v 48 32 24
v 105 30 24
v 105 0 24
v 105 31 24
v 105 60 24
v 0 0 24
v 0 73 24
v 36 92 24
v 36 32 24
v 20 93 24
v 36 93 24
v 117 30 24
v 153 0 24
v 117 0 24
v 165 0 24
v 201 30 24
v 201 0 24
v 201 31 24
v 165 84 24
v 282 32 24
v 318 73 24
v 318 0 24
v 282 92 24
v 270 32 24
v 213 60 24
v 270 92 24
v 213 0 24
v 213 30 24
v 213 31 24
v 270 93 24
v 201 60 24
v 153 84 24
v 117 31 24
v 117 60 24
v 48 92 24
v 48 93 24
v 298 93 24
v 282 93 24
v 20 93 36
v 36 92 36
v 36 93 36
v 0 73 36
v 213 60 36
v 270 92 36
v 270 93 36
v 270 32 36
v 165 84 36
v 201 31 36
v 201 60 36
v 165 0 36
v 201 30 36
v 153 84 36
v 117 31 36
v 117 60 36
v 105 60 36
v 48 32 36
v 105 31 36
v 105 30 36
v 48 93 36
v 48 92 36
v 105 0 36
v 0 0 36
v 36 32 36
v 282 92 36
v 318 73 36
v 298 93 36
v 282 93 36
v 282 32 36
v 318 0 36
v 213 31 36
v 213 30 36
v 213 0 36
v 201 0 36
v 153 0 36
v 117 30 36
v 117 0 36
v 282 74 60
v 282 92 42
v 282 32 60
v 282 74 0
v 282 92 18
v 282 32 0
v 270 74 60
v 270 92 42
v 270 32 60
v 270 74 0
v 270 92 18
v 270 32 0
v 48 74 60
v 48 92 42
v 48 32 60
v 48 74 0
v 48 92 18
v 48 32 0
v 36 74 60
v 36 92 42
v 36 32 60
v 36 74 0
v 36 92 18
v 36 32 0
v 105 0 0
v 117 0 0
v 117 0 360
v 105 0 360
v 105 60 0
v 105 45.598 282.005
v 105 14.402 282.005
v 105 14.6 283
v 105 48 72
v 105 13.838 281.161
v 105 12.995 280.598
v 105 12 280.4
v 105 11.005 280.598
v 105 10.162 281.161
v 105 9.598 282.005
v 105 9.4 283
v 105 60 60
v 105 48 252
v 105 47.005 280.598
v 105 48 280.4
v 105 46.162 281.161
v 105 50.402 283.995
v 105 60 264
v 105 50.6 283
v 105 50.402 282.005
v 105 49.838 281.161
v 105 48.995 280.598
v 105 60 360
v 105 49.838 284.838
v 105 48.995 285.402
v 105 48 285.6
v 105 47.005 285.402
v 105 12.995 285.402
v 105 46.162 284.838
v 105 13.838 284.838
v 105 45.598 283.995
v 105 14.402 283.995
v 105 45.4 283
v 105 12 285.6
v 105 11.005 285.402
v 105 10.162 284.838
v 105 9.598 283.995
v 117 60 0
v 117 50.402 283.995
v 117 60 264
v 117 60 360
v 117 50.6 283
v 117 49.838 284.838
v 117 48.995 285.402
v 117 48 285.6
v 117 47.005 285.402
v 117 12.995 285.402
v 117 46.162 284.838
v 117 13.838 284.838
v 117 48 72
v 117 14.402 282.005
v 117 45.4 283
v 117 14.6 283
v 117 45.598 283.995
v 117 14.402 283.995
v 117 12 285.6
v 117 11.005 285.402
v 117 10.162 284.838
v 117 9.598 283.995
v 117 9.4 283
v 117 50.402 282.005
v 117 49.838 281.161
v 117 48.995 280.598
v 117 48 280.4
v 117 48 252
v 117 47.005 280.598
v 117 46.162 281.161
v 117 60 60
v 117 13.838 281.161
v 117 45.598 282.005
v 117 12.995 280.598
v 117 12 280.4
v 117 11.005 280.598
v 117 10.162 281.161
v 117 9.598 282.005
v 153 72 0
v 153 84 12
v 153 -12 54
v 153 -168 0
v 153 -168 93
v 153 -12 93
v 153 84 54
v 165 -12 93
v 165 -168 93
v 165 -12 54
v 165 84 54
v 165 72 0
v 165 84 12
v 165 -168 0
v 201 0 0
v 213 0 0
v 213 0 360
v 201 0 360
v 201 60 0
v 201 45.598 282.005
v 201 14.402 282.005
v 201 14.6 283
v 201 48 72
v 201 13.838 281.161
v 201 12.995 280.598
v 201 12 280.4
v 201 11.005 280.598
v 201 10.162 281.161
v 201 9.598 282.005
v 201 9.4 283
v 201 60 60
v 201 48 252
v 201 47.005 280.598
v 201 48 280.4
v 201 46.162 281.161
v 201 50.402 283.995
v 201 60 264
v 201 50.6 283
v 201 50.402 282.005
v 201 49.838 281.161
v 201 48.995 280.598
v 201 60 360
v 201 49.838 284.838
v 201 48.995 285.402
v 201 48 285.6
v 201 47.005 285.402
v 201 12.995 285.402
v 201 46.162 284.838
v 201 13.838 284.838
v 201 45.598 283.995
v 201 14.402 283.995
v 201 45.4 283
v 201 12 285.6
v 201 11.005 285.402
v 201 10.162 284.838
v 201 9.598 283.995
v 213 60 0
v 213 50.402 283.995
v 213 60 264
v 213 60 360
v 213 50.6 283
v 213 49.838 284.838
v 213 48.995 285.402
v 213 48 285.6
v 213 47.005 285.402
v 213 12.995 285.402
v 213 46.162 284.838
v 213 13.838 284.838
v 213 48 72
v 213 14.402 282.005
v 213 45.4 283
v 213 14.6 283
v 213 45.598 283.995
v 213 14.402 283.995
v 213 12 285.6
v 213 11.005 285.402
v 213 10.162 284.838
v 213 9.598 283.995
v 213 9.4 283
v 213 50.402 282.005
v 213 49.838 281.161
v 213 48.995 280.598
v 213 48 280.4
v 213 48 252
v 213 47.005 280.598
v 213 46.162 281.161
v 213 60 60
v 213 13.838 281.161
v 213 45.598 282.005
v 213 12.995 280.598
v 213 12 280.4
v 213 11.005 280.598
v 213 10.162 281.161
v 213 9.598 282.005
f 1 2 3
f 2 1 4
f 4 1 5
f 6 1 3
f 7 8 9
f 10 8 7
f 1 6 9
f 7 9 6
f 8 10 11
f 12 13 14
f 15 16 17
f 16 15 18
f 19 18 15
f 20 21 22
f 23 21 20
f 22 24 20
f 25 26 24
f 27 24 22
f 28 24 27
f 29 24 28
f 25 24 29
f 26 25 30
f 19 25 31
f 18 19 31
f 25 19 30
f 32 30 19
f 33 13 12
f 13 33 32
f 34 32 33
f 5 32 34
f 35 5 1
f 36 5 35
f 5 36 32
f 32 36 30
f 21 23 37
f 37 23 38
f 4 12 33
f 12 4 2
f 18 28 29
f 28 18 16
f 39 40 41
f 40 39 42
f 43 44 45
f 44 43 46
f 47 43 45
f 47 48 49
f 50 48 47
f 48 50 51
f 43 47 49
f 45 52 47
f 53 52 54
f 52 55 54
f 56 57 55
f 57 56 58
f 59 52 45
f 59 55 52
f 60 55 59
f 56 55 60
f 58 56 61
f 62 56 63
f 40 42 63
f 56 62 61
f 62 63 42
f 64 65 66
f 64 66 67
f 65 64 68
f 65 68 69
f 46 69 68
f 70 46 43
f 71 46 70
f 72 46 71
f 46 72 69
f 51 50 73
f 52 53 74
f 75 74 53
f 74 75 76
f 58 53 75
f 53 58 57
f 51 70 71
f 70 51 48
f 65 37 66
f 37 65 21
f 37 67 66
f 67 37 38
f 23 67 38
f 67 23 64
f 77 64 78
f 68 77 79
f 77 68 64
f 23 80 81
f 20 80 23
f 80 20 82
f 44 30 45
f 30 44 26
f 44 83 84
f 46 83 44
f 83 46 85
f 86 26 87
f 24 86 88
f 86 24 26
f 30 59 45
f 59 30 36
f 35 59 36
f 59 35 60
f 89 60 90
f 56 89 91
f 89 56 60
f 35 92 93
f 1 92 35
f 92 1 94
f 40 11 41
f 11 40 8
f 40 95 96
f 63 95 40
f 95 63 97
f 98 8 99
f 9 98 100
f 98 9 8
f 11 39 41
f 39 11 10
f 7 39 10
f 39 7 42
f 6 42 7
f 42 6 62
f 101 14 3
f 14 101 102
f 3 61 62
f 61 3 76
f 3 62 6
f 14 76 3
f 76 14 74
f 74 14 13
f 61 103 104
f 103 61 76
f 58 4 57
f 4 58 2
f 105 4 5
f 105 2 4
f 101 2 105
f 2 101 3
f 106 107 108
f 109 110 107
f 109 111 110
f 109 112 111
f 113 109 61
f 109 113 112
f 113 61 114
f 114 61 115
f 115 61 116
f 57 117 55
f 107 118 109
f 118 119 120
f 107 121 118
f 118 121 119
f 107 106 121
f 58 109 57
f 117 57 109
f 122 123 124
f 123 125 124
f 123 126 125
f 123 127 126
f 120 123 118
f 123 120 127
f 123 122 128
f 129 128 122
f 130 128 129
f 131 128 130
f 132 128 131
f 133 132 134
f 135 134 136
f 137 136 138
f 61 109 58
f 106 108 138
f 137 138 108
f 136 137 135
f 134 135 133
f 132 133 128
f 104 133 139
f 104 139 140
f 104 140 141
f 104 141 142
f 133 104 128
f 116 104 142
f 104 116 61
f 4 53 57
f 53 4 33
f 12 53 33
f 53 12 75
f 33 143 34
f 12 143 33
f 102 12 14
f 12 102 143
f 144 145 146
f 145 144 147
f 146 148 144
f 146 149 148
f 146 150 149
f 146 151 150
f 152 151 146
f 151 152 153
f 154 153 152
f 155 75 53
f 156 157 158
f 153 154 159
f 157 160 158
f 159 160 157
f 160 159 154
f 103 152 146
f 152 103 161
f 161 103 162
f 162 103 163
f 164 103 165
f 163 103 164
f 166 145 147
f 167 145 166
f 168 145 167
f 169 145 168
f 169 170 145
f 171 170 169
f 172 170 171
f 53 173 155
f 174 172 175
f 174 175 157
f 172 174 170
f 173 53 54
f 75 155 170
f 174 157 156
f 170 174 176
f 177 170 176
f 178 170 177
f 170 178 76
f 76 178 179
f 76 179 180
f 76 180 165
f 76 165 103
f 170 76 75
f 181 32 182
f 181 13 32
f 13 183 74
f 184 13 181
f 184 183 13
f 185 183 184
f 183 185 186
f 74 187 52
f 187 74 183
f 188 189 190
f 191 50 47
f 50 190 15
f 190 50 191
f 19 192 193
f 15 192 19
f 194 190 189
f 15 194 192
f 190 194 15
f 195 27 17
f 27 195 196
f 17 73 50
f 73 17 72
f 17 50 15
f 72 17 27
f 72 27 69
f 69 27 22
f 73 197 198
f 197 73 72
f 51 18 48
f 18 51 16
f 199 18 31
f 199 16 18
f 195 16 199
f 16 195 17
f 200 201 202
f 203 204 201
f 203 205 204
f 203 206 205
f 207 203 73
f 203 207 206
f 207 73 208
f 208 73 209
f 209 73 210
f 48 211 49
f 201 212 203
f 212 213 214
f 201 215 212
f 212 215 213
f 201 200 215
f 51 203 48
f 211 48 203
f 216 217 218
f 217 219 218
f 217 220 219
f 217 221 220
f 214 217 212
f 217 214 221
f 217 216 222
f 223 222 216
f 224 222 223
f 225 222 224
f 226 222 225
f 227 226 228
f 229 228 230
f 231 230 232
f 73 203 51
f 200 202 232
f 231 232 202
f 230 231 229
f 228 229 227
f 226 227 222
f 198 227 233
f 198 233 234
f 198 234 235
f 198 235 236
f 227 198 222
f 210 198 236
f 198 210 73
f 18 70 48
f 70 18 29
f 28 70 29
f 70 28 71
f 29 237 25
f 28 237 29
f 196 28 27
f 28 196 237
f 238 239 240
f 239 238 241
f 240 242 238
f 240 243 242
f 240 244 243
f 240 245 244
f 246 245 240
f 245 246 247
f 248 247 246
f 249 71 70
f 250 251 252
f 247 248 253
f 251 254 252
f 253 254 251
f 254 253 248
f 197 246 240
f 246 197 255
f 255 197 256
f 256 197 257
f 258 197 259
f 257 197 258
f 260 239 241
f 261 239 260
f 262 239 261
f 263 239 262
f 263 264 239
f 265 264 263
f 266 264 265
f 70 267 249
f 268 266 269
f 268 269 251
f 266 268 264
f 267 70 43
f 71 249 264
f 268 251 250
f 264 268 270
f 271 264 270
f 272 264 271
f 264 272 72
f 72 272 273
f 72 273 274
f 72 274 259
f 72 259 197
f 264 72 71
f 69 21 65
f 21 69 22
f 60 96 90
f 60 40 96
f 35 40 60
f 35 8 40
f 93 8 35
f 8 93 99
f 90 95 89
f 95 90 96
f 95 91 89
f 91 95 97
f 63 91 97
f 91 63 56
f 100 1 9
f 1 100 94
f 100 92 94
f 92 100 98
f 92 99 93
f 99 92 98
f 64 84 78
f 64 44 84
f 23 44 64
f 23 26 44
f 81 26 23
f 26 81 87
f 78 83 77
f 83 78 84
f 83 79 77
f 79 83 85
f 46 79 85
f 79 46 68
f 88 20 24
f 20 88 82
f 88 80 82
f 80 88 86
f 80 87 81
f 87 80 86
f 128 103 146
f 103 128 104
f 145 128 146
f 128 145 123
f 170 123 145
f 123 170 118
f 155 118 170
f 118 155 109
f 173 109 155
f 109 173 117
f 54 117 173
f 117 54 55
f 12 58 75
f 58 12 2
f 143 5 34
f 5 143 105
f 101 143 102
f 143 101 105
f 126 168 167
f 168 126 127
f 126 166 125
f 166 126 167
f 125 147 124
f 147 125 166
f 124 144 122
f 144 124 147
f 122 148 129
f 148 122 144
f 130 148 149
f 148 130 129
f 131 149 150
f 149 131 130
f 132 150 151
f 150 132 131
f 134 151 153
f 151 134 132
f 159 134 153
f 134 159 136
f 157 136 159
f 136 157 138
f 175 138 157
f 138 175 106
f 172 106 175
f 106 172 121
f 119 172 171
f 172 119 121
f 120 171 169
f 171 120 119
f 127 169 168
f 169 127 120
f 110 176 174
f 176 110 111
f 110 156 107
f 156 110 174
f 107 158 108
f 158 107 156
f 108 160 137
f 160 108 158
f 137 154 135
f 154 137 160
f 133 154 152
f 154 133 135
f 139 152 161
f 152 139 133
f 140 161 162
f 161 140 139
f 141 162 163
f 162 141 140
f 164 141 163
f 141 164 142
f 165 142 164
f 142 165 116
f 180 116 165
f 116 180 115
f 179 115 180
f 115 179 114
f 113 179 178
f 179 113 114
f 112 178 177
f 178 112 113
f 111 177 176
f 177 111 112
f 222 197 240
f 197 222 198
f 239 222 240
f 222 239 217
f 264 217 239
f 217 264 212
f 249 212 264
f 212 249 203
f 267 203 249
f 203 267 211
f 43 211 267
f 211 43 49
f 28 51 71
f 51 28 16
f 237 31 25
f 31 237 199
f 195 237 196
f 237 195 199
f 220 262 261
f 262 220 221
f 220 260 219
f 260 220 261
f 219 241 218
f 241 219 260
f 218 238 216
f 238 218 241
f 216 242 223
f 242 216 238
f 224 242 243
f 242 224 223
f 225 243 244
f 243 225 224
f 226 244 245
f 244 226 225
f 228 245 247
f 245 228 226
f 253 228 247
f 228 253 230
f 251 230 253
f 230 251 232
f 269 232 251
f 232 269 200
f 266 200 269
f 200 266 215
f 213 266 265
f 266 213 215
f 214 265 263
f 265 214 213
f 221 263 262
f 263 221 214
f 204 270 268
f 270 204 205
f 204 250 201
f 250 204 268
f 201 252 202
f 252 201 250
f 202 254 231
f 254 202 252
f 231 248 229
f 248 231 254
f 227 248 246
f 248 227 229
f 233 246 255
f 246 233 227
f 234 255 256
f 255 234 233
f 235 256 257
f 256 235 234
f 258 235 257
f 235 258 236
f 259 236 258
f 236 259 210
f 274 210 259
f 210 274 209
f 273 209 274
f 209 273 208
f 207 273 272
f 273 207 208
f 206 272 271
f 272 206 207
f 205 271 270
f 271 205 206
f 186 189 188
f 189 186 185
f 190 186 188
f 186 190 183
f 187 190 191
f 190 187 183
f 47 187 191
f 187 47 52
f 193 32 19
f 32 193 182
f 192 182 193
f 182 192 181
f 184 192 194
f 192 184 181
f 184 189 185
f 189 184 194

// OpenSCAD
// file: ../../lib/util.scad
// ==========================================================================
//  Turtle Body -- shared helper modules and functions
// --------------------------------------------------------------------------
//  Small pieces that were copy-pasted across the standalone files. Geometry
//  lives in the per-subsystem lib/ modules; this file is only glue.
//
//  Definitions only -- no top-level geometry, no top-level assignments.
// ==========================================================================

use <params.scad>

// Colour wrapper for wooden parts. When colour coding is off, every wooden
// component renders in one neutral wood tone; bottles, hardware, sails and
// printed parts keep their own colours and never call this.
module wood_color(coded_color, enabled = true, neutral = [0.94, 0.83, 0.62]) {
    color(enabled ? coded_color : neutral) children();
}

// scalar clamp
function clamp(v, lo, hi) = v < lo ? lo : (v > hi ? hi : v);

// Visual-only M6 bolt: plain shaft + hex-less cylindrical head. No thread,
// no torque rating -- a placeholder for fit inspection.
//  Local Z=0 is the underside of the head; the shaft runs toward +Z from Z=0
//  (plus an optional tip_extension), the head sits at Z=-head_t..0. Matches
//  the standalone files.
module m6_bolt_placeholder(grip_length, tip_extension = 1,
                           shaft_d = undef, head_d = undef, head_t = undef,
                           color_rgb = [0.15, 0.15, 0.15], fn = 48) {
    sd = shaft_d == undef ? p_m6_bolt_shaft_d() : shaft_d;
    hd = head_d  == undef ? p_m6_bolt_head_d()  : head_d;
    ht = head_t  == undef ? p_m6_bolt_head_t()  : head_t;
    assert(grip_length > 0, "m6_bolt_placeholder: grip_length must be positive.");
    color(color_rgb)
        union() {
            cylinder(d = sd, h = grip_length + tip_extension, $fn = fn);
            translate([0, 0, -ht])
                cylinder(d = hd, h = ht, $fn = fn);
        }
}

// Regular hexagonal prism specified by across-flats width (OpenSCAD's
// cylinder($fn=6) is specified across corners, which is the usual trap).
module hex_prism_af(across_flats, h, center = false) {
    cylinder(d = across_flats / cos(30), h = h, $fn = 6, center = center);
}
// main file
/*
 Hope Turtle — standalone ballast attachment. Units: mm.
 License: CERN-OHL-S-2.0.
 Two green core slats, one orange bottom board, two red lock feet, one
 yellow ballast fin. No bottle. Individual pieces lie flat on Z=0;
 the assembly raises its lowest component to Z=0.

 SOURCE FILE — geometry lives in lib/ballast_fin.scad + lib/params.scad.
 The committed self-contained file is generated by build/build.py.
*/

part = "assembly"; // [assembly,core_slat,bottom_board,lock_foot,fin]
enable_color_coding = true;
ballast_fin_inspection_pullout = 0; // mm; 0 seats the fin

use <../../lib/ballast_fin.scad>

if (part == "assembly") {
    translate([0, 0, max(bl_lower_lobe(),
                         (bl_lock_h() - bl_lock_slot_h()) / 2,
                         bl_fin_lower_protrusion())])
        local_ballast_assembly(inspection_pullout = ballast_fin_inspection_pullout,
                               colored = enable_color_coding);
} else if (part == "core_slat") {
    ballast_core_slat_part(colored = enable_color_coding);
} else if (part == "bottom_board") {
    ballast_bottom_board_part(colored = enable_color_coding);
} else if (part == "lock_foot") {
    ballast_lock_part(colored = enable_color_coding);
} else if (part == "fin") {
    ballast_fin_part(colored = enable_color_coding);
} else {
    assert(false, str("Unknown part: ", part));
}
